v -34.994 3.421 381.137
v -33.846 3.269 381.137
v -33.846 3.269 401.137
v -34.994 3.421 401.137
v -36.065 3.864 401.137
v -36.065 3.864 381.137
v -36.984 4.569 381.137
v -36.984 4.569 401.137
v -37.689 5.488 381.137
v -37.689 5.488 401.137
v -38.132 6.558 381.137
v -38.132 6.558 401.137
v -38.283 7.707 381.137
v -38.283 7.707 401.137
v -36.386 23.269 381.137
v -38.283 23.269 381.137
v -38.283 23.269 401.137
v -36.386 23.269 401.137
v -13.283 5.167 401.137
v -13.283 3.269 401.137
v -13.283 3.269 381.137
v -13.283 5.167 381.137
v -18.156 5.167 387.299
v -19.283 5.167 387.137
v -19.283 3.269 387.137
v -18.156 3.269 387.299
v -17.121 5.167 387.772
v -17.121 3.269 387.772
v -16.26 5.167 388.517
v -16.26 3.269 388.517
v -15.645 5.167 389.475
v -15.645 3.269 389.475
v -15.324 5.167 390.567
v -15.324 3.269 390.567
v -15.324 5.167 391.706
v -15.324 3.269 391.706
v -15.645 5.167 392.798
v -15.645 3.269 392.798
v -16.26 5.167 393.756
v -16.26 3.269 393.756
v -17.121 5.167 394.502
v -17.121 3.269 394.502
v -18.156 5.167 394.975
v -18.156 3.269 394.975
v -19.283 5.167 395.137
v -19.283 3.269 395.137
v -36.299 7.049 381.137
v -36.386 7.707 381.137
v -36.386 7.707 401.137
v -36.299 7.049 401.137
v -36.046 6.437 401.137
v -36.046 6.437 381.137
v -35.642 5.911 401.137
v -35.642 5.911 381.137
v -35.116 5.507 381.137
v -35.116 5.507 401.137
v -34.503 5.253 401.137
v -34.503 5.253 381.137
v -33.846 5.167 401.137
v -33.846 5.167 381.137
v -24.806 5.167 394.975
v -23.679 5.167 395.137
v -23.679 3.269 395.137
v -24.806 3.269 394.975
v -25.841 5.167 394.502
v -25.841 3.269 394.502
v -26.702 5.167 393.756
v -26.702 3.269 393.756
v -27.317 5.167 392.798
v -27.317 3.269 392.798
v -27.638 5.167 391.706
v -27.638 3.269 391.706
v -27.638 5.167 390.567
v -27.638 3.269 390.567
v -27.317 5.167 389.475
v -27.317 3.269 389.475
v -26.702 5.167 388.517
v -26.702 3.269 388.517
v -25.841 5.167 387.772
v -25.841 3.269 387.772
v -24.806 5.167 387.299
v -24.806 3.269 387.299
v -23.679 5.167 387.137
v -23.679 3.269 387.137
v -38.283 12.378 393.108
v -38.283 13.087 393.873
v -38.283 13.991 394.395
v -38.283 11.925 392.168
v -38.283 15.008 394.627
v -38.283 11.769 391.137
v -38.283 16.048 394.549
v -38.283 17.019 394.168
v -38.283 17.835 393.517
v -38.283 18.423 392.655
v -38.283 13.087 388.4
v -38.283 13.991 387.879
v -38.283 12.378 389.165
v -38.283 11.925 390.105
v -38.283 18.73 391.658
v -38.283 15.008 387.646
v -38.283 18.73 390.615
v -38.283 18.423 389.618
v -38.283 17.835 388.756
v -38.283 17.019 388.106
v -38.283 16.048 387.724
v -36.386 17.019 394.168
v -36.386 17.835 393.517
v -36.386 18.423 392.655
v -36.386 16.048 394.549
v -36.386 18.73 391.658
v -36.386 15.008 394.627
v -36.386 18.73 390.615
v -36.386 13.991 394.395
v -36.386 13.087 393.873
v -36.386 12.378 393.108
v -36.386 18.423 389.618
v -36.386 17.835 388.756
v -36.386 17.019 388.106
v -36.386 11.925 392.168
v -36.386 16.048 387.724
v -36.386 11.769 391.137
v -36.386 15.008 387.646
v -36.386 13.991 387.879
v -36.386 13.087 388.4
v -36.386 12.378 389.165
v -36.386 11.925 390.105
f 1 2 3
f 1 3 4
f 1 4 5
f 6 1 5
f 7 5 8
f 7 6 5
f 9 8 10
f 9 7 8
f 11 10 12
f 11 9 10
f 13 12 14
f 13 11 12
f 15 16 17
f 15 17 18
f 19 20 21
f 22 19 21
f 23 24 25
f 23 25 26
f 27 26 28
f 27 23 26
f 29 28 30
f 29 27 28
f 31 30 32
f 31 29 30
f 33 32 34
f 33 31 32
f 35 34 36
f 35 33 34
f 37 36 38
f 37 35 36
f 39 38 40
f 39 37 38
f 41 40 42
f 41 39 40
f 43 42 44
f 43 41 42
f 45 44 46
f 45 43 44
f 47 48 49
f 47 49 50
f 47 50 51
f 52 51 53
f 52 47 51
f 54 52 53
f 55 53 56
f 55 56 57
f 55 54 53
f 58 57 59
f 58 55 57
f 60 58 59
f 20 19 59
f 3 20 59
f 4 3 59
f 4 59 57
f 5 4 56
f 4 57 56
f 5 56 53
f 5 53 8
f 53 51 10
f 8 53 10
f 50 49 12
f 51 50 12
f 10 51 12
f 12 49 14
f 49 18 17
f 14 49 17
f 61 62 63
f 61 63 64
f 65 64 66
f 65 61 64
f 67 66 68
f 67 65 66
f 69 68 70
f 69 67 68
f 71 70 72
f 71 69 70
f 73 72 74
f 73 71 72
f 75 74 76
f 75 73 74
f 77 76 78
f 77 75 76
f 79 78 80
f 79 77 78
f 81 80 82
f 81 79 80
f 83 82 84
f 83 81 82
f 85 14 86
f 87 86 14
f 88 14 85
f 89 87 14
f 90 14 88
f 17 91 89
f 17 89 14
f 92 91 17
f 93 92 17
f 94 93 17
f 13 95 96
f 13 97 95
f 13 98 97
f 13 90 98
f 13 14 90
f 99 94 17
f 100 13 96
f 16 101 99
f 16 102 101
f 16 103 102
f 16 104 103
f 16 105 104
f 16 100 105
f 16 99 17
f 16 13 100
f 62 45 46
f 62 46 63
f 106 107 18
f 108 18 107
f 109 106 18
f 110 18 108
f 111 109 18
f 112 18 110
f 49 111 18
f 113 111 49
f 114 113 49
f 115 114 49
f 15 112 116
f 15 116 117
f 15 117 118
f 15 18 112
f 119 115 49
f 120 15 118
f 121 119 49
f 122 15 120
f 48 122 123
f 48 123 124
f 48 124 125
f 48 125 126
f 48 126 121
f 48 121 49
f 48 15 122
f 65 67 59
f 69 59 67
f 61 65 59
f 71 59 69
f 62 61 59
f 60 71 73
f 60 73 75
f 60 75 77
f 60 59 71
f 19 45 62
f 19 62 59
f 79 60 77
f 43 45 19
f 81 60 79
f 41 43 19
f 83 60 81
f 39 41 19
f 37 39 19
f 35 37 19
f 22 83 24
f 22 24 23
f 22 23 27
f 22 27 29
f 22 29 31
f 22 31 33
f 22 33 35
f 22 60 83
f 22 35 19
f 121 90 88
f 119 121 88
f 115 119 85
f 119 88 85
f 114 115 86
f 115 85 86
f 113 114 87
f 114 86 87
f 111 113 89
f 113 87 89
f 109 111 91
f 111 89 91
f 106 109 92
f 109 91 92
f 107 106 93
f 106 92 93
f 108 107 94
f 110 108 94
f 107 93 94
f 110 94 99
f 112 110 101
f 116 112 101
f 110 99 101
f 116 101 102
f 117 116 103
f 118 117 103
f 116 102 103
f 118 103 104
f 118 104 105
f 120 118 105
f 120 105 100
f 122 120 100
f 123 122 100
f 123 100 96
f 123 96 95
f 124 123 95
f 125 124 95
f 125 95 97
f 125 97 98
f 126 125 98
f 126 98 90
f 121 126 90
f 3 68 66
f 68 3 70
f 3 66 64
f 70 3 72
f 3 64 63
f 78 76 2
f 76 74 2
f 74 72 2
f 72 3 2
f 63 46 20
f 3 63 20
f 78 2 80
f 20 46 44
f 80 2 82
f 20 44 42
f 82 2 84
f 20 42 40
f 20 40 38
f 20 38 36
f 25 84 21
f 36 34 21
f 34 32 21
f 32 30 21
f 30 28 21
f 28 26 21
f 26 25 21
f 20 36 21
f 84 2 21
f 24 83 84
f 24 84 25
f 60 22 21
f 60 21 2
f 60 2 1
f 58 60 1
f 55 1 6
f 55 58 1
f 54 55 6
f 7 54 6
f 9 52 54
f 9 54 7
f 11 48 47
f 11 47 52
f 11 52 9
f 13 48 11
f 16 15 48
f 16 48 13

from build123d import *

# Parameters (mm, degrees)
SKETCH2_W                    = 25
SKETCH2_H                    = 20
BASE_FLANGE1_DEPTH           = 1.89738
EDGE_FLANGE1_STRIP_W         = 12.66952
EDGE_FLANGE1_STRIP_H         = 1.89738
EDGE_FLANGE1_STRIP_CUT_DEPTH = 20
EDGE_FLANGE1_DEPTH           = 20
SKETCH11_R                   = 3.5
CUT_EXTRUDE1_DEPTH           = 10
CUT_EXTRUDE2_DEPTH           = 10


# Sheet-metal steps are written as plain solids
with BuildPart() as part:
    # Sketch2 → Base-Flange1 (new body)
    with BuildSketch(Plane(origin=(0, 3.26937922, 0), x_dir=(1, 0, 0), z_dir=(0, 1, 0))):
        with Locations((-25.783324161, -391.136685208)):
            Rectangle(SKETCH2_W, SKETCH2_H)
    extrude(amount=BASE_FLANGE1_DEPTH)

    # Edge-Flange1 strip (across the edge) → Edge-Flange1 strip cut (cut)
    with BuildSketch(Plane(origin=(-38.283324161, 5.16675922, 381.136685208), x_dir=(1, 0, 0), z_dir=(0, 0, 1))):
        with Locations((-1.89738, -0.94869)):
            Rectangle(EDGE_FLANGE1_STRIP_W, EDGE_FLANGE1_STRIP_H)
    extrude(amount=EDGE_FLANGE1_STRIP_CUT_DEPTH, mode=Mode.SUBTRACT)

    # Edge-Flange1 section (across the edge) → Edge-Flange1 (add)
    with BuildSketch(Plane(origin=(-38.283324161, 5.16675922, 381.136685208), x_dir=(1, 0, 0), z_dir=(0, 0, 1))):
        with BuildLine():
            Line((0, 2.54), (0, 18.10262))
            Line((0, 18.10262), (1.89738, 18.10262))
            Line((1.89738, 18.10262), (1.89738, 2.54))
            ThreePointArc((1.89738, 2.54), (2.641328776, 0.743948776), (4.43738, 0))
            Line((4.43738, 0), (4.43738, -1.89738))
            ThreePointArc((4.43738, -1.89738), (1.299678511, -0.597701489), (0, 2.54))
        make_face()
    extrude(amount=EDGE_FLANGE1_DEPTH)

    # Sketch11 → Cut-Extrude1 (cut)
    with BuildSketch(Plane.ZY.offset(38.283324161)):
        with Locations(Location((391.136685208, 15.26937922, 0), (0, 0, 270))):
            Circle(SKETCH11_R)
    extrude(amount=-CUT_EXTRUDE1_DEPTH, mode=Mode.SUBTRACT)

    # Sketch13 → Cut-Extrude2 (cut)
    with BuildSketch(Plane(origin=(0, 5.16675922, 0), x_dir=(1, 0, 0), z_dir=(0, 1, 0))):
        with BuildLine():
            Line((-23.678800395, -387.136685208), (-19.283324161, -387.136685208))
            ThreePointArc((-19.283324161, -387.136685208), (-15.283324161, -391.136685208), (-19.283324161, -395.136685208))
            Line((-19.283324161, -395.136685208), (-23.678800395, -395.136685208))
            ThreePointArc((-23.678800395, -395.136685208), (-27.678800395, -391.136685208), (-23.678800395, -387.136685208))
        make_face()
    extrude(amount=-CUT_EXTRUDE2_DEPTH, mode=Mode.SUBTRACT)


solid = part.part
